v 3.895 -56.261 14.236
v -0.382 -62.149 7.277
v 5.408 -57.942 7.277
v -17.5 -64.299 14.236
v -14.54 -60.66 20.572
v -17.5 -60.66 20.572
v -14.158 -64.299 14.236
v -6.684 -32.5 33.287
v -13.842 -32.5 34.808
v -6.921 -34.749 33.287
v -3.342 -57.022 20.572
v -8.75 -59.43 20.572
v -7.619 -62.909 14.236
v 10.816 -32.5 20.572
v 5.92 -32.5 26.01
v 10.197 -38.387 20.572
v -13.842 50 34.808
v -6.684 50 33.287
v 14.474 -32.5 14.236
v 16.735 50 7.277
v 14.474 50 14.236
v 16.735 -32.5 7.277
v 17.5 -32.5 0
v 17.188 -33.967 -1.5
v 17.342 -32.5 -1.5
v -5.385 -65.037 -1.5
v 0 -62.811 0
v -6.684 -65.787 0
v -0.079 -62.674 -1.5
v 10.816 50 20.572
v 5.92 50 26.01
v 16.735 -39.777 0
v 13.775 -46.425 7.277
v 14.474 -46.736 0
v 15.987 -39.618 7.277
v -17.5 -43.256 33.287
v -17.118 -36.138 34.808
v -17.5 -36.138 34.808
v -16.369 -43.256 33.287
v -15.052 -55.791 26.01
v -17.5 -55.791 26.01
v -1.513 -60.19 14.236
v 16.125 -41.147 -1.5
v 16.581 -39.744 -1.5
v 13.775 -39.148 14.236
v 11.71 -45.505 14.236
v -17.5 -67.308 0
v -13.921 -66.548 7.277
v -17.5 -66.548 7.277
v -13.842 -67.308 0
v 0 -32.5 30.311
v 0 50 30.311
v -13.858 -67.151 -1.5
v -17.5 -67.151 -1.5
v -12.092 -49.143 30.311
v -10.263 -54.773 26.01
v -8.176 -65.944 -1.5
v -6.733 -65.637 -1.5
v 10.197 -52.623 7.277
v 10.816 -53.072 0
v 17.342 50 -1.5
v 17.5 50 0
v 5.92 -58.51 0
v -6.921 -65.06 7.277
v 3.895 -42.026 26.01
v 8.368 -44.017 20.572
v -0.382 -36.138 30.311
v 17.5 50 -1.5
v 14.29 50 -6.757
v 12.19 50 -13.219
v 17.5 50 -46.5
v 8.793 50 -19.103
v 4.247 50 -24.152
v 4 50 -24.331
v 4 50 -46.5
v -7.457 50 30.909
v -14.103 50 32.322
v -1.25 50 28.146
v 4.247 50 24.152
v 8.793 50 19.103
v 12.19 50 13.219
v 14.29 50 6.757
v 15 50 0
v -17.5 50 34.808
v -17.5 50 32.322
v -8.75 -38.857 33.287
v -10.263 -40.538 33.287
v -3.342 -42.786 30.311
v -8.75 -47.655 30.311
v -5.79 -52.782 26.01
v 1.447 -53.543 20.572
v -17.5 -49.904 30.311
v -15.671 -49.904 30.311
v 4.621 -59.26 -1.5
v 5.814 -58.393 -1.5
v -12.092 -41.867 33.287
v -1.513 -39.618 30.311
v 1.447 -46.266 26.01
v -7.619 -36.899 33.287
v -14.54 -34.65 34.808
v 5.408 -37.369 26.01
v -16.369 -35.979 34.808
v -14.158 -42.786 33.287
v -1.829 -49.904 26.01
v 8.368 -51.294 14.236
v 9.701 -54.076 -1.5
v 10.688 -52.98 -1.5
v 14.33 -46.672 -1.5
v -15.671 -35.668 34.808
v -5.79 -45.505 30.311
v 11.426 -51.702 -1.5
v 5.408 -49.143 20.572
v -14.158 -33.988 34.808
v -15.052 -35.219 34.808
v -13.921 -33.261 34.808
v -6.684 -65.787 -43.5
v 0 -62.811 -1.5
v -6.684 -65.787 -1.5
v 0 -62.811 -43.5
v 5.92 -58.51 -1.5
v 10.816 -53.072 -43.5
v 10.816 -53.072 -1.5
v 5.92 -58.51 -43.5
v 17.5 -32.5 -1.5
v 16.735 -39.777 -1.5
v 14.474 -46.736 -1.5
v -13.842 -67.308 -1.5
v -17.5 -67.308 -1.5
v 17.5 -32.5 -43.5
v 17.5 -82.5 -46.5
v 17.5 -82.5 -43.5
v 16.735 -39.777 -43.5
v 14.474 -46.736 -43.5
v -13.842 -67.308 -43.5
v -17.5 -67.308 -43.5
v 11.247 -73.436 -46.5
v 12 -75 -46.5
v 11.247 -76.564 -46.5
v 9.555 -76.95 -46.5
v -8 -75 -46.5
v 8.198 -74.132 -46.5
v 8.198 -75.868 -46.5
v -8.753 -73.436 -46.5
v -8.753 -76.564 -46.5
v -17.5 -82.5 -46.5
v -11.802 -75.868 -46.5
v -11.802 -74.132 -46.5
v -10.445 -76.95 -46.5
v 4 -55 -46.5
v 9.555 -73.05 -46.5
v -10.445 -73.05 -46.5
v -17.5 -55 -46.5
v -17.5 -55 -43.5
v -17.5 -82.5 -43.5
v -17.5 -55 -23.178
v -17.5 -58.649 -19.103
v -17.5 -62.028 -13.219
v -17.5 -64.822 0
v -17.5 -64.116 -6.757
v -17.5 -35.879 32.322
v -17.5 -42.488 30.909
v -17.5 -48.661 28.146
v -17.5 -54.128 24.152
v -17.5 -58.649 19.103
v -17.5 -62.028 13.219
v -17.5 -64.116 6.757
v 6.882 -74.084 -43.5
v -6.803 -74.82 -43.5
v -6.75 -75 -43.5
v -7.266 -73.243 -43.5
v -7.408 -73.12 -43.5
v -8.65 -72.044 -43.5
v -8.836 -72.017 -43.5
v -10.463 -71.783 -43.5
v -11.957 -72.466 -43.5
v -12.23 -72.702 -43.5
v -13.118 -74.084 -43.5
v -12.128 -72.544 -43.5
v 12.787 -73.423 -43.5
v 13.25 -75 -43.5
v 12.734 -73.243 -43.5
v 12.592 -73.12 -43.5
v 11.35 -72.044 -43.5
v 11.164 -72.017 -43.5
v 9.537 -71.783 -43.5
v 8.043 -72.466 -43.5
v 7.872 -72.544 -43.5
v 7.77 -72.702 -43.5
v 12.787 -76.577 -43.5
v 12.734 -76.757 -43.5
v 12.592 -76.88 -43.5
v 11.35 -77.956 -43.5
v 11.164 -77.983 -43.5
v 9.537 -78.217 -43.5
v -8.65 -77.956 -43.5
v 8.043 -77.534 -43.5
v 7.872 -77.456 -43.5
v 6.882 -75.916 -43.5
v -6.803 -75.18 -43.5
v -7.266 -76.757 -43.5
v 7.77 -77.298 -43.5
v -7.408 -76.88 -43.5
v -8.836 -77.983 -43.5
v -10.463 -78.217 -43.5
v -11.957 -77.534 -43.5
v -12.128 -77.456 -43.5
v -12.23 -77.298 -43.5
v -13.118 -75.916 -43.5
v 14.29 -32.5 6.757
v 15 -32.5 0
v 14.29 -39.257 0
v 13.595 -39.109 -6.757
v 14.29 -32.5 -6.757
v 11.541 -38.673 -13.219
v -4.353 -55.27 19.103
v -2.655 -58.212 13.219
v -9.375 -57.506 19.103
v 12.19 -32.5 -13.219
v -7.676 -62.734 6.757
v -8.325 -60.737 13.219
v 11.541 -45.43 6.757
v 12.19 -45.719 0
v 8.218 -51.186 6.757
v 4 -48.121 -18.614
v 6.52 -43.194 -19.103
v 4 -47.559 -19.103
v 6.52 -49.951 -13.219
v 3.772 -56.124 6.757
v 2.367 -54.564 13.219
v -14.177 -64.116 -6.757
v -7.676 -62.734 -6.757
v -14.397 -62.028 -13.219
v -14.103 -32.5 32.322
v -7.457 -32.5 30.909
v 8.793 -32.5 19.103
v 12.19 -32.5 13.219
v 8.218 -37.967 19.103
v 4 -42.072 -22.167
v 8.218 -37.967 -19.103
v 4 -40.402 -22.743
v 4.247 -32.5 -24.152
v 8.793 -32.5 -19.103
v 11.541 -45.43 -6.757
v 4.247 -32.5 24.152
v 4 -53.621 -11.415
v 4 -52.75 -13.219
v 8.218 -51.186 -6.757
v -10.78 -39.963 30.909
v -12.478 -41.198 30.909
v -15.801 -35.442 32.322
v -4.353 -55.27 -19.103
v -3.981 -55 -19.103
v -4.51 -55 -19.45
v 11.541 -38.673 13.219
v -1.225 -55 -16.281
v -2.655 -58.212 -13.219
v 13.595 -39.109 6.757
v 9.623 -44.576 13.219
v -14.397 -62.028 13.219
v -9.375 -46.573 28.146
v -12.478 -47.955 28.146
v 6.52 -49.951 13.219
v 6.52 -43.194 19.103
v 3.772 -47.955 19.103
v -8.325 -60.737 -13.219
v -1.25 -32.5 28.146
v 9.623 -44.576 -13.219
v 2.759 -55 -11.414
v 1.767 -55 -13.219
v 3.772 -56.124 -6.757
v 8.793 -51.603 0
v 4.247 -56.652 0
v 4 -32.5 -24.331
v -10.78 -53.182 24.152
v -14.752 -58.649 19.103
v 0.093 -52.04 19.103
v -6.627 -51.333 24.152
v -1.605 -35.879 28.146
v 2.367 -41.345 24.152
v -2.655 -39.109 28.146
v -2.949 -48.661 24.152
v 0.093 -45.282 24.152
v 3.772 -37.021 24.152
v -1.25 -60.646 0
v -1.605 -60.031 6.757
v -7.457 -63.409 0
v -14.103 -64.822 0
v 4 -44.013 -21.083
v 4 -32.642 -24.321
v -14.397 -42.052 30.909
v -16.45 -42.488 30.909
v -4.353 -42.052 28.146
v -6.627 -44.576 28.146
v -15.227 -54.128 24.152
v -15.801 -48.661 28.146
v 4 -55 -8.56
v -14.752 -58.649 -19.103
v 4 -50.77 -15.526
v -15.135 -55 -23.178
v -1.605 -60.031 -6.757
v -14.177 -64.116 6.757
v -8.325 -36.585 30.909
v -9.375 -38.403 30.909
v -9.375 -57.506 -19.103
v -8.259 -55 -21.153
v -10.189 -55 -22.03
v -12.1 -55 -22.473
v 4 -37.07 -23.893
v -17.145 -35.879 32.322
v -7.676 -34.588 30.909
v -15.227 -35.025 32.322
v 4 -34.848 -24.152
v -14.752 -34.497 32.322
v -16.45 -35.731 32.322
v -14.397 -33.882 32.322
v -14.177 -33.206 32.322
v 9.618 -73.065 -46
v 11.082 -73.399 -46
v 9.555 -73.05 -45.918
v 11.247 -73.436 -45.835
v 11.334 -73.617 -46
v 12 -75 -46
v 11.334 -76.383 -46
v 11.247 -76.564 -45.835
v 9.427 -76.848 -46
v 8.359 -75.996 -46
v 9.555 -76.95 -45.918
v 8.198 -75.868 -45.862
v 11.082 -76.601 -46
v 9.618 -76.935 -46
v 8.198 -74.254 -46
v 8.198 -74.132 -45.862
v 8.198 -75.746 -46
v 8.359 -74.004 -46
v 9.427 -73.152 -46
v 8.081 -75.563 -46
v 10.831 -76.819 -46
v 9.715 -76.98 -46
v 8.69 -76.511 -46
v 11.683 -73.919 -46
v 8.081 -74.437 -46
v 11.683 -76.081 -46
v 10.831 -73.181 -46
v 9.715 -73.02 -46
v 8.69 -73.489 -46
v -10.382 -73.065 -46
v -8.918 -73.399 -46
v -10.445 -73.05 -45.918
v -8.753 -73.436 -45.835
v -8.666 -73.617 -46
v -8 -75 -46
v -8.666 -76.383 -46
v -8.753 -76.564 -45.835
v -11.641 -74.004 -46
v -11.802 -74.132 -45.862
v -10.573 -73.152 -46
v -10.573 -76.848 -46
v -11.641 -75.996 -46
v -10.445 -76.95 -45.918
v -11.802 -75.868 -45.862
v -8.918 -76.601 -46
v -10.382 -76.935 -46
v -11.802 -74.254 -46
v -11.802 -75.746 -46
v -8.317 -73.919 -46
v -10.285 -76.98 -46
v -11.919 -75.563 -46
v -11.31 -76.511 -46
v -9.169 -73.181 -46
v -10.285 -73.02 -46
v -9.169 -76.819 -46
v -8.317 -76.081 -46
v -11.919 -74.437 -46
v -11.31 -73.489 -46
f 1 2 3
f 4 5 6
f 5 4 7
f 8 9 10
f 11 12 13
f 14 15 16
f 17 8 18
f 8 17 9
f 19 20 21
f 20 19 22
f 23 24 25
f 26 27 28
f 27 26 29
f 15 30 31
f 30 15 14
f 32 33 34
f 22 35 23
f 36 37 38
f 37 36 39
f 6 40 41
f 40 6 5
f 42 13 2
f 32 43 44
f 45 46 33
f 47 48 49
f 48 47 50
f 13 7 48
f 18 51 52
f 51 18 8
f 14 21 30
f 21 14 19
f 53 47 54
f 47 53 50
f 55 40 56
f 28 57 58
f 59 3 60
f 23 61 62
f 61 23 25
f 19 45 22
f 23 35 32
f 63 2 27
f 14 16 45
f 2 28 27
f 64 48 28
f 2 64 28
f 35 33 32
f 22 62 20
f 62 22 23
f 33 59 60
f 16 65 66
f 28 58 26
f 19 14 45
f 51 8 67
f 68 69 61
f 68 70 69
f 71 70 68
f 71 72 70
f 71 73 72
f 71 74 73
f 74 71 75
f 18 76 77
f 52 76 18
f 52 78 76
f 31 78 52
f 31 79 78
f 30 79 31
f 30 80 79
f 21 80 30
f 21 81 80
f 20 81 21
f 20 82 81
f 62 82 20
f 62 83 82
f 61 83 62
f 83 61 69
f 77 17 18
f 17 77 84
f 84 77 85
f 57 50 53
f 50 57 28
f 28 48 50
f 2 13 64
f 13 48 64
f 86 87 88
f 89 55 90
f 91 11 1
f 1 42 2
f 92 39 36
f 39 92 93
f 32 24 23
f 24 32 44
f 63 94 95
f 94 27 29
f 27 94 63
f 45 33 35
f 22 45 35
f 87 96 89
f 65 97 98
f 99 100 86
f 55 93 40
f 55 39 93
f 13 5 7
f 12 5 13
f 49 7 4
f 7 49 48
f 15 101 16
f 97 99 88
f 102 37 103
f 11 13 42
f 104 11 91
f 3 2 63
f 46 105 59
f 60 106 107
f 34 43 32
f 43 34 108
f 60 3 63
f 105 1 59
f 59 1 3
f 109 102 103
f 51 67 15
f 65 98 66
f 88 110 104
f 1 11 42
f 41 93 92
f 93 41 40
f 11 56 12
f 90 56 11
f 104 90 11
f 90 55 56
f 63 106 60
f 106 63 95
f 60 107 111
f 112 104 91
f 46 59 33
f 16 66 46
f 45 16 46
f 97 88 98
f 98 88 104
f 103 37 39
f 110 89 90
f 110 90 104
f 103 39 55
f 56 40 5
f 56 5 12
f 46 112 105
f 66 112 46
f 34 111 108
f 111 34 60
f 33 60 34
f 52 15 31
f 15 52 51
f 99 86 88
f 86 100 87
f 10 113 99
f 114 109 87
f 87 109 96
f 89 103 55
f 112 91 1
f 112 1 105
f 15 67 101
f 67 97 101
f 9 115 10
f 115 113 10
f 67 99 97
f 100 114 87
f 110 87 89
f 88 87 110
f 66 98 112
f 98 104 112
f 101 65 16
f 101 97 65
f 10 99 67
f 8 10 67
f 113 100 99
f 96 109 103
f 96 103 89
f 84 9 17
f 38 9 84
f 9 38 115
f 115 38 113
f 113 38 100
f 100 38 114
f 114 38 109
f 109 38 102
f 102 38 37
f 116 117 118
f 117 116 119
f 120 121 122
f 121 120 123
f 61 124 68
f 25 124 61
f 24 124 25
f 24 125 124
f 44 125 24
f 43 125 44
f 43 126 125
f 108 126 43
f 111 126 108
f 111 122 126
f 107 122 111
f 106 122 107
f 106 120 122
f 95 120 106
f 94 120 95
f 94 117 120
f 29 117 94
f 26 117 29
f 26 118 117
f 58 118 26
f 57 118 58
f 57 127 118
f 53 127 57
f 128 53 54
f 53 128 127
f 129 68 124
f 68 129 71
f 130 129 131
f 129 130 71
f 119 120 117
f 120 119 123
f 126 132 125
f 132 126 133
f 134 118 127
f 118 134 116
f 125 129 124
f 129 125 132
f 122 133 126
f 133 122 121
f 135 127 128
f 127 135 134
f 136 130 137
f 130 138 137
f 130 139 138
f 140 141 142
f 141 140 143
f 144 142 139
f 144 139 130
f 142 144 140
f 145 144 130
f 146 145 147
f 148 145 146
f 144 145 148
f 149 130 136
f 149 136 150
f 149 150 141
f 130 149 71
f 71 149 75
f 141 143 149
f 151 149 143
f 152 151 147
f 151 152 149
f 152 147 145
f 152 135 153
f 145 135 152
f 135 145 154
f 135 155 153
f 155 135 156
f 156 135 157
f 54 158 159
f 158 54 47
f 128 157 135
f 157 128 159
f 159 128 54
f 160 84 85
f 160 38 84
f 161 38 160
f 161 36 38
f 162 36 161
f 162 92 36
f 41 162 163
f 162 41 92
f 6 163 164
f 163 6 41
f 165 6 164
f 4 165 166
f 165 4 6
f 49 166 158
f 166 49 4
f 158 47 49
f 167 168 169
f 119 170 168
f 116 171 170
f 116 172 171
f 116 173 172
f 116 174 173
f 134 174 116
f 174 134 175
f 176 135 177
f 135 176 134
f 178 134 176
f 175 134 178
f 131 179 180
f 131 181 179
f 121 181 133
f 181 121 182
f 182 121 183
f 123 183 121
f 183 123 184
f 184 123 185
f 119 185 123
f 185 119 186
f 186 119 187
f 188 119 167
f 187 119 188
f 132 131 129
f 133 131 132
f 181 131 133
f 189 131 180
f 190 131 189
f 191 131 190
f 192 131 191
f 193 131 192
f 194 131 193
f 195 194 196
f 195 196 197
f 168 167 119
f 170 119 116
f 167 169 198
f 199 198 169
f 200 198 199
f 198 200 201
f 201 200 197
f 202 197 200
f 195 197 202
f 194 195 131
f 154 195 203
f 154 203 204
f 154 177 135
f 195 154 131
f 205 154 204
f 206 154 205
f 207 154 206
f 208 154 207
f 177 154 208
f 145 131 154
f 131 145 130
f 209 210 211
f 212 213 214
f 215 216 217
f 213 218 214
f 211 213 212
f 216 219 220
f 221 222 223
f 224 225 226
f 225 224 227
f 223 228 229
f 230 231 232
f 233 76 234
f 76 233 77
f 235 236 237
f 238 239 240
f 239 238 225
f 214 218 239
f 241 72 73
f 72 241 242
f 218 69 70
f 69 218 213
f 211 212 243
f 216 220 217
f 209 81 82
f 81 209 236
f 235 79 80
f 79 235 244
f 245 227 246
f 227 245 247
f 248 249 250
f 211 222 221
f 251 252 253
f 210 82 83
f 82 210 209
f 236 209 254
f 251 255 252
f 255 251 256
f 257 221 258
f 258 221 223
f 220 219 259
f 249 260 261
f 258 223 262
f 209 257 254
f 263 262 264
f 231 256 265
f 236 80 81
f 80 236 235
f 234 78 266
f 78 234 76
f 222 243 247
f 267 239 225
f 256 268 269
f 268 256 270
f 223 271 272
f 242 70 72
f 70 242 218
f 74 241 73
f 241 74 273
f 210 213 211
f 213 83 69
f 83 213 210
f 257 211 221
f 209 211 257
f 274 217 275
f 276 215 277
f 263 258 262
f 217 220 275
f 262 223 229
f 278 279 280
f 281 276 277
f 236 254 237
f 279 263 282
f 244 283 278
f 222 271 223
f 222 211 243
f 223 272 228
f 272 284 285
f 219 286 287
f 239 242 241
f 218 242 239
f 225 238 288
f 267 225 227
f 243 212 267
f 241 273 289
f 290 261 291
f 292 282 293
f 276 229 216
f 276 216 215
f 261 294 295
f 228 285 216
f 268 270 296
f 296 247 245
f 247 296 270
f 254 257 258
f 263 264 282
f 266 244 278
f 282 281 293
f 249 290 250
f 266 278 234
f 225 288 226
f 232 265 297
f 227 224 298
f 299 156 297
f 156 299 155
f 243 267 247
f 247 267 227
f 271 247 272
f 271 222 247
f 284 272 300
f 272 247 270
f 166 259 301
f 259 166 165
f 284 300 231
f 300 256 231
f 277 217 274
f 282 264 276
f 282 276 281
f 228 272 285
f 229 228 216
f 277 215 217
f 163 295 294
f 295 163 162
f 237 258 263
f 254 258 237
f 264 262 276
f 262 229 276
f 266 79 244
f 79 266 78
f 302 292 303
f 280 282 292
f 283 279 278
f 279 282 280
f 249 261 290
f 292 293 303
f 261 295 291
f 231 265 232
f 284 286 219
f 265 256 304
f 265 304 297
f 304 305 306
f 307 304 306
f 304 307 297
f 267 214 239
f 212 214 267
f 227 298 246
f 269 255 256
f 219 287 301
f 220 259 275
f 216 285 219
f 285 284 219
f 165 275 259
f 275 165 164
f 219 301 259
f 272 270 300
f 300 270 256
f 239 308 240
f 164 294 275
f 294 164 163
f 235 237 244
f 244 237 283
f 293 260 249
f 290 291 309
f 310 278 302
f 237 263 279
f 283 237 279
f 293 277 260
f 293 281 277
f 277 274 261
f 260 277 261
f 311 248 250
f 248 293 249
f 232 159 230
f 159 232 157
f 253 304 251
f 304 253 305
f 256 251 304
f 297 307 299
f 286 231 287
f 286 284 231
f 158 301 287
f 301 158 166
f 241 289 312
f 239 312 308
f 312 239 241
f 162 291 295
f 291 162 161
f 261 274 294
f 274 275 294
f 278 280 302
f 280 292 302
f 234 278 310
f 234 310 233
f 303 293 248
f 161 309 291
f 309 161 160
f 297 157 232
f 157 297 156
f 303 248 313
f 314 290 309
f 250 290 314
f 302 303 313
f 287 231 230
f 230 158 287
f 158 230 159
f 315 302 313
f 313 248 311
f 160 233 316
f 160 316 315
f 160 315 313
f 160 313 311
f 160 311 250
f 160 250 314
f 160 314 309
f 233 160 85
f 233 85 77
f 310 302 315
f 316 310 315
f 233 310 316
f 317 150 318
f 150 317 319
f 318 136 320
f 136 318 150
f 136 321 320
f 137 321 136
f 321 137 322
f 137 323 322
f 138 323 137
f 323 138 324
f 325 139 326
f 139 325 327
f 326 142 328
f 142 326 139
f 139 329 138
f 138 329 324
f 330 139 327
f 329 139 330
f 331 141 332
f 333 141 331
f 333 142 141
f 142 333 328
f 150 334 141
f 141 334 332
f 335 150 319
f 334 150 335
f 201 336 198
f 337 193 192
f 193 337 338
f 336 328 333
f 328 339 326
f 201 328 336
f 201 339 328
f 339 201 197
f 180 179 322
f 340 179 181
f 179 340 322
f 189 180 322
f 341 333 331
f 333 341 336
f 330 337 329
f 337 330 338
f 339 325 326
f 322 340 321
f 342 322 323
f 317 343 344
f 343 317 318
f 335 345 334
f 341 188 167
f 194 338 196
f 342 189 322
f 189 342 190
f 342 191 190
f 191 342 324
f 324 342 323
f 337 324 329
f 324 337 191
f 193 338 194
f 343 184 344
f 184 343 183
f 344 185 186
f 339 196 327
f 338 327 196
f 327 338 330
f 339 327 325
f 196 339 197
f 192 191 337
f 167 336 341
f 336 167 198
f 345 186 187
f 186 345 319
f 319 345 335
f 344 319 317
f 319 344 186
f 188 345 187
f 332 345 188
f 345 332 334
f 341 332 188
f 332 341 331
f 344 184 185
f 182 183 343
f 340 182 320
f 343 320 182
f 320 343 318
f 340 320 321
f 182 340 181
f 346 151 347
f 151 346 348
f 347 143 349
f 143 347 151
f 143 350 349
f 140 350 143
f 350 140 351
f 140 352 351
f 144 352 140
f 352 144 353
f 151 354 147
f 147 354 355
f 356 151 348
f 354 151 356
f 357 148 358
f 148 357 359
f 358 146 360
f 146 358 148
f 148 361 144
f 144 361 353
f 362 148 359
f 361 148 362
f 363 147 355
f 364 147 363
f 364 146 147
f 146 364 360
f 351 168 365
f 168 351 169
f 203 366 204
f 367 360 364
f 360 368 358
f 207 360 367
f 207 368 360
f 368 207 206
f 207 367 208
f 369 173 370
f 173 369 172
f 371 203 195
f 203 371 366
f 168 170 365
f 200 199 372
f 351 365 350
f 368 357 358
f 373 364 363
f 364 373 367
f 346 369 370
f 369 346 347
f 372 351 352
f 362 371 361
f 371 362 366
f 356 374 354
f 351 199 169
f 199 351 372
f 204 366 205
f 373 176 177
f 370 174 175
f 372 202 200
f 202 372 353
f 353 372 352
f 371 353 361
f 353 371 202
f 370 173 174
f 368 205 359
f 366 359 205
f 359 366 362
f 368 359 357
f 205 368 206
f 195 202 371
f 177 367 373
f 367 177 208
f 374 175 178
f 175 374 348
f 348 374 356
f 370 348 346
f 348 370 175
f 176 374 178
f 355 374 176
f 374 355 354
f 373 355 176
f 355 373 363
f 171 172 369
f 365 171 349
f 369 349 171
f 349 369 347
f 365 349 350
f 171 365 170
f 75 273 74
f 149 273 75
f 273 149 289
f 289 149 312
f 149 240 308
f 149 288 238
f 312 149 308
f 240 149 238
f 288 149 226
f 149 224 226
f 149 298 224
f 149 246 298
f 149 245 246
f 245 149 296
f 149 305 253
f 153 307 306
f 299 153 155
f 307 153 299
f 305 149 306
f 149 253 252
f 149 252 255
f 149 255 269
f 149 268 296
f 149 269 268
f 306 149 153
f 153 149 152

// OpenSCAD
difference() {
union() {
  difference() {
    union() {
      hull() {
        translate([-17.5,-32.5,0]) sphere(r=35,center=true);
        translate([-17.5,32.5,0]) rotate([90,0,0]) cylinder(r=35,h=35,center=true);
//        translate([-17.5,32.5,0]) sphere(r=35,center=true);
      }
      hull() {
        translate([-17.5,-32.5,-24]) cylinder(r=35,h=45,center=true);
        translate([-17.5,32.5,-24]) cube([70,35,45],center=true);
//        translate([-17.5,32.5,-24]) cylinder(r=35,h=45,center=true);
      }
    }
  translate([-37.5,0,-5.5]) cube([40,170,84],center=true);
  }
translate([0,-47.5,-45]) cube([35,70,3],center=true);
}

//translate([-12,0,0]) cube([60,168,98],center=true);
  hull() {
    translate([-17.5,-32.5,0]) sphere(r=32.5,center=true);
    translate([-17.5,47.5,0]) rotate([90,0,0]) cylinder(r=32.5,h=62.5,center=true);
//    translate([-17.5,32.5,0]) sphere(r=32.5,center=true);
  }
  translate([10,-75,-46]) cylinder(r=2,h=10,center=true);
  translate([10,-75,-44.5]) cylinder(r1=2,r2=3.5,h=3,center=true);
  translate([-10,-75,-46]) cylinder(r=2,h=10,center=true);
  translate([-10,-75,-44.5]) cylinder(r1=2,r2=3.5,h=3,center=true);
  translate([-7,0,-38]) cube([22,110,60],center=true); //Buzzblock
}
